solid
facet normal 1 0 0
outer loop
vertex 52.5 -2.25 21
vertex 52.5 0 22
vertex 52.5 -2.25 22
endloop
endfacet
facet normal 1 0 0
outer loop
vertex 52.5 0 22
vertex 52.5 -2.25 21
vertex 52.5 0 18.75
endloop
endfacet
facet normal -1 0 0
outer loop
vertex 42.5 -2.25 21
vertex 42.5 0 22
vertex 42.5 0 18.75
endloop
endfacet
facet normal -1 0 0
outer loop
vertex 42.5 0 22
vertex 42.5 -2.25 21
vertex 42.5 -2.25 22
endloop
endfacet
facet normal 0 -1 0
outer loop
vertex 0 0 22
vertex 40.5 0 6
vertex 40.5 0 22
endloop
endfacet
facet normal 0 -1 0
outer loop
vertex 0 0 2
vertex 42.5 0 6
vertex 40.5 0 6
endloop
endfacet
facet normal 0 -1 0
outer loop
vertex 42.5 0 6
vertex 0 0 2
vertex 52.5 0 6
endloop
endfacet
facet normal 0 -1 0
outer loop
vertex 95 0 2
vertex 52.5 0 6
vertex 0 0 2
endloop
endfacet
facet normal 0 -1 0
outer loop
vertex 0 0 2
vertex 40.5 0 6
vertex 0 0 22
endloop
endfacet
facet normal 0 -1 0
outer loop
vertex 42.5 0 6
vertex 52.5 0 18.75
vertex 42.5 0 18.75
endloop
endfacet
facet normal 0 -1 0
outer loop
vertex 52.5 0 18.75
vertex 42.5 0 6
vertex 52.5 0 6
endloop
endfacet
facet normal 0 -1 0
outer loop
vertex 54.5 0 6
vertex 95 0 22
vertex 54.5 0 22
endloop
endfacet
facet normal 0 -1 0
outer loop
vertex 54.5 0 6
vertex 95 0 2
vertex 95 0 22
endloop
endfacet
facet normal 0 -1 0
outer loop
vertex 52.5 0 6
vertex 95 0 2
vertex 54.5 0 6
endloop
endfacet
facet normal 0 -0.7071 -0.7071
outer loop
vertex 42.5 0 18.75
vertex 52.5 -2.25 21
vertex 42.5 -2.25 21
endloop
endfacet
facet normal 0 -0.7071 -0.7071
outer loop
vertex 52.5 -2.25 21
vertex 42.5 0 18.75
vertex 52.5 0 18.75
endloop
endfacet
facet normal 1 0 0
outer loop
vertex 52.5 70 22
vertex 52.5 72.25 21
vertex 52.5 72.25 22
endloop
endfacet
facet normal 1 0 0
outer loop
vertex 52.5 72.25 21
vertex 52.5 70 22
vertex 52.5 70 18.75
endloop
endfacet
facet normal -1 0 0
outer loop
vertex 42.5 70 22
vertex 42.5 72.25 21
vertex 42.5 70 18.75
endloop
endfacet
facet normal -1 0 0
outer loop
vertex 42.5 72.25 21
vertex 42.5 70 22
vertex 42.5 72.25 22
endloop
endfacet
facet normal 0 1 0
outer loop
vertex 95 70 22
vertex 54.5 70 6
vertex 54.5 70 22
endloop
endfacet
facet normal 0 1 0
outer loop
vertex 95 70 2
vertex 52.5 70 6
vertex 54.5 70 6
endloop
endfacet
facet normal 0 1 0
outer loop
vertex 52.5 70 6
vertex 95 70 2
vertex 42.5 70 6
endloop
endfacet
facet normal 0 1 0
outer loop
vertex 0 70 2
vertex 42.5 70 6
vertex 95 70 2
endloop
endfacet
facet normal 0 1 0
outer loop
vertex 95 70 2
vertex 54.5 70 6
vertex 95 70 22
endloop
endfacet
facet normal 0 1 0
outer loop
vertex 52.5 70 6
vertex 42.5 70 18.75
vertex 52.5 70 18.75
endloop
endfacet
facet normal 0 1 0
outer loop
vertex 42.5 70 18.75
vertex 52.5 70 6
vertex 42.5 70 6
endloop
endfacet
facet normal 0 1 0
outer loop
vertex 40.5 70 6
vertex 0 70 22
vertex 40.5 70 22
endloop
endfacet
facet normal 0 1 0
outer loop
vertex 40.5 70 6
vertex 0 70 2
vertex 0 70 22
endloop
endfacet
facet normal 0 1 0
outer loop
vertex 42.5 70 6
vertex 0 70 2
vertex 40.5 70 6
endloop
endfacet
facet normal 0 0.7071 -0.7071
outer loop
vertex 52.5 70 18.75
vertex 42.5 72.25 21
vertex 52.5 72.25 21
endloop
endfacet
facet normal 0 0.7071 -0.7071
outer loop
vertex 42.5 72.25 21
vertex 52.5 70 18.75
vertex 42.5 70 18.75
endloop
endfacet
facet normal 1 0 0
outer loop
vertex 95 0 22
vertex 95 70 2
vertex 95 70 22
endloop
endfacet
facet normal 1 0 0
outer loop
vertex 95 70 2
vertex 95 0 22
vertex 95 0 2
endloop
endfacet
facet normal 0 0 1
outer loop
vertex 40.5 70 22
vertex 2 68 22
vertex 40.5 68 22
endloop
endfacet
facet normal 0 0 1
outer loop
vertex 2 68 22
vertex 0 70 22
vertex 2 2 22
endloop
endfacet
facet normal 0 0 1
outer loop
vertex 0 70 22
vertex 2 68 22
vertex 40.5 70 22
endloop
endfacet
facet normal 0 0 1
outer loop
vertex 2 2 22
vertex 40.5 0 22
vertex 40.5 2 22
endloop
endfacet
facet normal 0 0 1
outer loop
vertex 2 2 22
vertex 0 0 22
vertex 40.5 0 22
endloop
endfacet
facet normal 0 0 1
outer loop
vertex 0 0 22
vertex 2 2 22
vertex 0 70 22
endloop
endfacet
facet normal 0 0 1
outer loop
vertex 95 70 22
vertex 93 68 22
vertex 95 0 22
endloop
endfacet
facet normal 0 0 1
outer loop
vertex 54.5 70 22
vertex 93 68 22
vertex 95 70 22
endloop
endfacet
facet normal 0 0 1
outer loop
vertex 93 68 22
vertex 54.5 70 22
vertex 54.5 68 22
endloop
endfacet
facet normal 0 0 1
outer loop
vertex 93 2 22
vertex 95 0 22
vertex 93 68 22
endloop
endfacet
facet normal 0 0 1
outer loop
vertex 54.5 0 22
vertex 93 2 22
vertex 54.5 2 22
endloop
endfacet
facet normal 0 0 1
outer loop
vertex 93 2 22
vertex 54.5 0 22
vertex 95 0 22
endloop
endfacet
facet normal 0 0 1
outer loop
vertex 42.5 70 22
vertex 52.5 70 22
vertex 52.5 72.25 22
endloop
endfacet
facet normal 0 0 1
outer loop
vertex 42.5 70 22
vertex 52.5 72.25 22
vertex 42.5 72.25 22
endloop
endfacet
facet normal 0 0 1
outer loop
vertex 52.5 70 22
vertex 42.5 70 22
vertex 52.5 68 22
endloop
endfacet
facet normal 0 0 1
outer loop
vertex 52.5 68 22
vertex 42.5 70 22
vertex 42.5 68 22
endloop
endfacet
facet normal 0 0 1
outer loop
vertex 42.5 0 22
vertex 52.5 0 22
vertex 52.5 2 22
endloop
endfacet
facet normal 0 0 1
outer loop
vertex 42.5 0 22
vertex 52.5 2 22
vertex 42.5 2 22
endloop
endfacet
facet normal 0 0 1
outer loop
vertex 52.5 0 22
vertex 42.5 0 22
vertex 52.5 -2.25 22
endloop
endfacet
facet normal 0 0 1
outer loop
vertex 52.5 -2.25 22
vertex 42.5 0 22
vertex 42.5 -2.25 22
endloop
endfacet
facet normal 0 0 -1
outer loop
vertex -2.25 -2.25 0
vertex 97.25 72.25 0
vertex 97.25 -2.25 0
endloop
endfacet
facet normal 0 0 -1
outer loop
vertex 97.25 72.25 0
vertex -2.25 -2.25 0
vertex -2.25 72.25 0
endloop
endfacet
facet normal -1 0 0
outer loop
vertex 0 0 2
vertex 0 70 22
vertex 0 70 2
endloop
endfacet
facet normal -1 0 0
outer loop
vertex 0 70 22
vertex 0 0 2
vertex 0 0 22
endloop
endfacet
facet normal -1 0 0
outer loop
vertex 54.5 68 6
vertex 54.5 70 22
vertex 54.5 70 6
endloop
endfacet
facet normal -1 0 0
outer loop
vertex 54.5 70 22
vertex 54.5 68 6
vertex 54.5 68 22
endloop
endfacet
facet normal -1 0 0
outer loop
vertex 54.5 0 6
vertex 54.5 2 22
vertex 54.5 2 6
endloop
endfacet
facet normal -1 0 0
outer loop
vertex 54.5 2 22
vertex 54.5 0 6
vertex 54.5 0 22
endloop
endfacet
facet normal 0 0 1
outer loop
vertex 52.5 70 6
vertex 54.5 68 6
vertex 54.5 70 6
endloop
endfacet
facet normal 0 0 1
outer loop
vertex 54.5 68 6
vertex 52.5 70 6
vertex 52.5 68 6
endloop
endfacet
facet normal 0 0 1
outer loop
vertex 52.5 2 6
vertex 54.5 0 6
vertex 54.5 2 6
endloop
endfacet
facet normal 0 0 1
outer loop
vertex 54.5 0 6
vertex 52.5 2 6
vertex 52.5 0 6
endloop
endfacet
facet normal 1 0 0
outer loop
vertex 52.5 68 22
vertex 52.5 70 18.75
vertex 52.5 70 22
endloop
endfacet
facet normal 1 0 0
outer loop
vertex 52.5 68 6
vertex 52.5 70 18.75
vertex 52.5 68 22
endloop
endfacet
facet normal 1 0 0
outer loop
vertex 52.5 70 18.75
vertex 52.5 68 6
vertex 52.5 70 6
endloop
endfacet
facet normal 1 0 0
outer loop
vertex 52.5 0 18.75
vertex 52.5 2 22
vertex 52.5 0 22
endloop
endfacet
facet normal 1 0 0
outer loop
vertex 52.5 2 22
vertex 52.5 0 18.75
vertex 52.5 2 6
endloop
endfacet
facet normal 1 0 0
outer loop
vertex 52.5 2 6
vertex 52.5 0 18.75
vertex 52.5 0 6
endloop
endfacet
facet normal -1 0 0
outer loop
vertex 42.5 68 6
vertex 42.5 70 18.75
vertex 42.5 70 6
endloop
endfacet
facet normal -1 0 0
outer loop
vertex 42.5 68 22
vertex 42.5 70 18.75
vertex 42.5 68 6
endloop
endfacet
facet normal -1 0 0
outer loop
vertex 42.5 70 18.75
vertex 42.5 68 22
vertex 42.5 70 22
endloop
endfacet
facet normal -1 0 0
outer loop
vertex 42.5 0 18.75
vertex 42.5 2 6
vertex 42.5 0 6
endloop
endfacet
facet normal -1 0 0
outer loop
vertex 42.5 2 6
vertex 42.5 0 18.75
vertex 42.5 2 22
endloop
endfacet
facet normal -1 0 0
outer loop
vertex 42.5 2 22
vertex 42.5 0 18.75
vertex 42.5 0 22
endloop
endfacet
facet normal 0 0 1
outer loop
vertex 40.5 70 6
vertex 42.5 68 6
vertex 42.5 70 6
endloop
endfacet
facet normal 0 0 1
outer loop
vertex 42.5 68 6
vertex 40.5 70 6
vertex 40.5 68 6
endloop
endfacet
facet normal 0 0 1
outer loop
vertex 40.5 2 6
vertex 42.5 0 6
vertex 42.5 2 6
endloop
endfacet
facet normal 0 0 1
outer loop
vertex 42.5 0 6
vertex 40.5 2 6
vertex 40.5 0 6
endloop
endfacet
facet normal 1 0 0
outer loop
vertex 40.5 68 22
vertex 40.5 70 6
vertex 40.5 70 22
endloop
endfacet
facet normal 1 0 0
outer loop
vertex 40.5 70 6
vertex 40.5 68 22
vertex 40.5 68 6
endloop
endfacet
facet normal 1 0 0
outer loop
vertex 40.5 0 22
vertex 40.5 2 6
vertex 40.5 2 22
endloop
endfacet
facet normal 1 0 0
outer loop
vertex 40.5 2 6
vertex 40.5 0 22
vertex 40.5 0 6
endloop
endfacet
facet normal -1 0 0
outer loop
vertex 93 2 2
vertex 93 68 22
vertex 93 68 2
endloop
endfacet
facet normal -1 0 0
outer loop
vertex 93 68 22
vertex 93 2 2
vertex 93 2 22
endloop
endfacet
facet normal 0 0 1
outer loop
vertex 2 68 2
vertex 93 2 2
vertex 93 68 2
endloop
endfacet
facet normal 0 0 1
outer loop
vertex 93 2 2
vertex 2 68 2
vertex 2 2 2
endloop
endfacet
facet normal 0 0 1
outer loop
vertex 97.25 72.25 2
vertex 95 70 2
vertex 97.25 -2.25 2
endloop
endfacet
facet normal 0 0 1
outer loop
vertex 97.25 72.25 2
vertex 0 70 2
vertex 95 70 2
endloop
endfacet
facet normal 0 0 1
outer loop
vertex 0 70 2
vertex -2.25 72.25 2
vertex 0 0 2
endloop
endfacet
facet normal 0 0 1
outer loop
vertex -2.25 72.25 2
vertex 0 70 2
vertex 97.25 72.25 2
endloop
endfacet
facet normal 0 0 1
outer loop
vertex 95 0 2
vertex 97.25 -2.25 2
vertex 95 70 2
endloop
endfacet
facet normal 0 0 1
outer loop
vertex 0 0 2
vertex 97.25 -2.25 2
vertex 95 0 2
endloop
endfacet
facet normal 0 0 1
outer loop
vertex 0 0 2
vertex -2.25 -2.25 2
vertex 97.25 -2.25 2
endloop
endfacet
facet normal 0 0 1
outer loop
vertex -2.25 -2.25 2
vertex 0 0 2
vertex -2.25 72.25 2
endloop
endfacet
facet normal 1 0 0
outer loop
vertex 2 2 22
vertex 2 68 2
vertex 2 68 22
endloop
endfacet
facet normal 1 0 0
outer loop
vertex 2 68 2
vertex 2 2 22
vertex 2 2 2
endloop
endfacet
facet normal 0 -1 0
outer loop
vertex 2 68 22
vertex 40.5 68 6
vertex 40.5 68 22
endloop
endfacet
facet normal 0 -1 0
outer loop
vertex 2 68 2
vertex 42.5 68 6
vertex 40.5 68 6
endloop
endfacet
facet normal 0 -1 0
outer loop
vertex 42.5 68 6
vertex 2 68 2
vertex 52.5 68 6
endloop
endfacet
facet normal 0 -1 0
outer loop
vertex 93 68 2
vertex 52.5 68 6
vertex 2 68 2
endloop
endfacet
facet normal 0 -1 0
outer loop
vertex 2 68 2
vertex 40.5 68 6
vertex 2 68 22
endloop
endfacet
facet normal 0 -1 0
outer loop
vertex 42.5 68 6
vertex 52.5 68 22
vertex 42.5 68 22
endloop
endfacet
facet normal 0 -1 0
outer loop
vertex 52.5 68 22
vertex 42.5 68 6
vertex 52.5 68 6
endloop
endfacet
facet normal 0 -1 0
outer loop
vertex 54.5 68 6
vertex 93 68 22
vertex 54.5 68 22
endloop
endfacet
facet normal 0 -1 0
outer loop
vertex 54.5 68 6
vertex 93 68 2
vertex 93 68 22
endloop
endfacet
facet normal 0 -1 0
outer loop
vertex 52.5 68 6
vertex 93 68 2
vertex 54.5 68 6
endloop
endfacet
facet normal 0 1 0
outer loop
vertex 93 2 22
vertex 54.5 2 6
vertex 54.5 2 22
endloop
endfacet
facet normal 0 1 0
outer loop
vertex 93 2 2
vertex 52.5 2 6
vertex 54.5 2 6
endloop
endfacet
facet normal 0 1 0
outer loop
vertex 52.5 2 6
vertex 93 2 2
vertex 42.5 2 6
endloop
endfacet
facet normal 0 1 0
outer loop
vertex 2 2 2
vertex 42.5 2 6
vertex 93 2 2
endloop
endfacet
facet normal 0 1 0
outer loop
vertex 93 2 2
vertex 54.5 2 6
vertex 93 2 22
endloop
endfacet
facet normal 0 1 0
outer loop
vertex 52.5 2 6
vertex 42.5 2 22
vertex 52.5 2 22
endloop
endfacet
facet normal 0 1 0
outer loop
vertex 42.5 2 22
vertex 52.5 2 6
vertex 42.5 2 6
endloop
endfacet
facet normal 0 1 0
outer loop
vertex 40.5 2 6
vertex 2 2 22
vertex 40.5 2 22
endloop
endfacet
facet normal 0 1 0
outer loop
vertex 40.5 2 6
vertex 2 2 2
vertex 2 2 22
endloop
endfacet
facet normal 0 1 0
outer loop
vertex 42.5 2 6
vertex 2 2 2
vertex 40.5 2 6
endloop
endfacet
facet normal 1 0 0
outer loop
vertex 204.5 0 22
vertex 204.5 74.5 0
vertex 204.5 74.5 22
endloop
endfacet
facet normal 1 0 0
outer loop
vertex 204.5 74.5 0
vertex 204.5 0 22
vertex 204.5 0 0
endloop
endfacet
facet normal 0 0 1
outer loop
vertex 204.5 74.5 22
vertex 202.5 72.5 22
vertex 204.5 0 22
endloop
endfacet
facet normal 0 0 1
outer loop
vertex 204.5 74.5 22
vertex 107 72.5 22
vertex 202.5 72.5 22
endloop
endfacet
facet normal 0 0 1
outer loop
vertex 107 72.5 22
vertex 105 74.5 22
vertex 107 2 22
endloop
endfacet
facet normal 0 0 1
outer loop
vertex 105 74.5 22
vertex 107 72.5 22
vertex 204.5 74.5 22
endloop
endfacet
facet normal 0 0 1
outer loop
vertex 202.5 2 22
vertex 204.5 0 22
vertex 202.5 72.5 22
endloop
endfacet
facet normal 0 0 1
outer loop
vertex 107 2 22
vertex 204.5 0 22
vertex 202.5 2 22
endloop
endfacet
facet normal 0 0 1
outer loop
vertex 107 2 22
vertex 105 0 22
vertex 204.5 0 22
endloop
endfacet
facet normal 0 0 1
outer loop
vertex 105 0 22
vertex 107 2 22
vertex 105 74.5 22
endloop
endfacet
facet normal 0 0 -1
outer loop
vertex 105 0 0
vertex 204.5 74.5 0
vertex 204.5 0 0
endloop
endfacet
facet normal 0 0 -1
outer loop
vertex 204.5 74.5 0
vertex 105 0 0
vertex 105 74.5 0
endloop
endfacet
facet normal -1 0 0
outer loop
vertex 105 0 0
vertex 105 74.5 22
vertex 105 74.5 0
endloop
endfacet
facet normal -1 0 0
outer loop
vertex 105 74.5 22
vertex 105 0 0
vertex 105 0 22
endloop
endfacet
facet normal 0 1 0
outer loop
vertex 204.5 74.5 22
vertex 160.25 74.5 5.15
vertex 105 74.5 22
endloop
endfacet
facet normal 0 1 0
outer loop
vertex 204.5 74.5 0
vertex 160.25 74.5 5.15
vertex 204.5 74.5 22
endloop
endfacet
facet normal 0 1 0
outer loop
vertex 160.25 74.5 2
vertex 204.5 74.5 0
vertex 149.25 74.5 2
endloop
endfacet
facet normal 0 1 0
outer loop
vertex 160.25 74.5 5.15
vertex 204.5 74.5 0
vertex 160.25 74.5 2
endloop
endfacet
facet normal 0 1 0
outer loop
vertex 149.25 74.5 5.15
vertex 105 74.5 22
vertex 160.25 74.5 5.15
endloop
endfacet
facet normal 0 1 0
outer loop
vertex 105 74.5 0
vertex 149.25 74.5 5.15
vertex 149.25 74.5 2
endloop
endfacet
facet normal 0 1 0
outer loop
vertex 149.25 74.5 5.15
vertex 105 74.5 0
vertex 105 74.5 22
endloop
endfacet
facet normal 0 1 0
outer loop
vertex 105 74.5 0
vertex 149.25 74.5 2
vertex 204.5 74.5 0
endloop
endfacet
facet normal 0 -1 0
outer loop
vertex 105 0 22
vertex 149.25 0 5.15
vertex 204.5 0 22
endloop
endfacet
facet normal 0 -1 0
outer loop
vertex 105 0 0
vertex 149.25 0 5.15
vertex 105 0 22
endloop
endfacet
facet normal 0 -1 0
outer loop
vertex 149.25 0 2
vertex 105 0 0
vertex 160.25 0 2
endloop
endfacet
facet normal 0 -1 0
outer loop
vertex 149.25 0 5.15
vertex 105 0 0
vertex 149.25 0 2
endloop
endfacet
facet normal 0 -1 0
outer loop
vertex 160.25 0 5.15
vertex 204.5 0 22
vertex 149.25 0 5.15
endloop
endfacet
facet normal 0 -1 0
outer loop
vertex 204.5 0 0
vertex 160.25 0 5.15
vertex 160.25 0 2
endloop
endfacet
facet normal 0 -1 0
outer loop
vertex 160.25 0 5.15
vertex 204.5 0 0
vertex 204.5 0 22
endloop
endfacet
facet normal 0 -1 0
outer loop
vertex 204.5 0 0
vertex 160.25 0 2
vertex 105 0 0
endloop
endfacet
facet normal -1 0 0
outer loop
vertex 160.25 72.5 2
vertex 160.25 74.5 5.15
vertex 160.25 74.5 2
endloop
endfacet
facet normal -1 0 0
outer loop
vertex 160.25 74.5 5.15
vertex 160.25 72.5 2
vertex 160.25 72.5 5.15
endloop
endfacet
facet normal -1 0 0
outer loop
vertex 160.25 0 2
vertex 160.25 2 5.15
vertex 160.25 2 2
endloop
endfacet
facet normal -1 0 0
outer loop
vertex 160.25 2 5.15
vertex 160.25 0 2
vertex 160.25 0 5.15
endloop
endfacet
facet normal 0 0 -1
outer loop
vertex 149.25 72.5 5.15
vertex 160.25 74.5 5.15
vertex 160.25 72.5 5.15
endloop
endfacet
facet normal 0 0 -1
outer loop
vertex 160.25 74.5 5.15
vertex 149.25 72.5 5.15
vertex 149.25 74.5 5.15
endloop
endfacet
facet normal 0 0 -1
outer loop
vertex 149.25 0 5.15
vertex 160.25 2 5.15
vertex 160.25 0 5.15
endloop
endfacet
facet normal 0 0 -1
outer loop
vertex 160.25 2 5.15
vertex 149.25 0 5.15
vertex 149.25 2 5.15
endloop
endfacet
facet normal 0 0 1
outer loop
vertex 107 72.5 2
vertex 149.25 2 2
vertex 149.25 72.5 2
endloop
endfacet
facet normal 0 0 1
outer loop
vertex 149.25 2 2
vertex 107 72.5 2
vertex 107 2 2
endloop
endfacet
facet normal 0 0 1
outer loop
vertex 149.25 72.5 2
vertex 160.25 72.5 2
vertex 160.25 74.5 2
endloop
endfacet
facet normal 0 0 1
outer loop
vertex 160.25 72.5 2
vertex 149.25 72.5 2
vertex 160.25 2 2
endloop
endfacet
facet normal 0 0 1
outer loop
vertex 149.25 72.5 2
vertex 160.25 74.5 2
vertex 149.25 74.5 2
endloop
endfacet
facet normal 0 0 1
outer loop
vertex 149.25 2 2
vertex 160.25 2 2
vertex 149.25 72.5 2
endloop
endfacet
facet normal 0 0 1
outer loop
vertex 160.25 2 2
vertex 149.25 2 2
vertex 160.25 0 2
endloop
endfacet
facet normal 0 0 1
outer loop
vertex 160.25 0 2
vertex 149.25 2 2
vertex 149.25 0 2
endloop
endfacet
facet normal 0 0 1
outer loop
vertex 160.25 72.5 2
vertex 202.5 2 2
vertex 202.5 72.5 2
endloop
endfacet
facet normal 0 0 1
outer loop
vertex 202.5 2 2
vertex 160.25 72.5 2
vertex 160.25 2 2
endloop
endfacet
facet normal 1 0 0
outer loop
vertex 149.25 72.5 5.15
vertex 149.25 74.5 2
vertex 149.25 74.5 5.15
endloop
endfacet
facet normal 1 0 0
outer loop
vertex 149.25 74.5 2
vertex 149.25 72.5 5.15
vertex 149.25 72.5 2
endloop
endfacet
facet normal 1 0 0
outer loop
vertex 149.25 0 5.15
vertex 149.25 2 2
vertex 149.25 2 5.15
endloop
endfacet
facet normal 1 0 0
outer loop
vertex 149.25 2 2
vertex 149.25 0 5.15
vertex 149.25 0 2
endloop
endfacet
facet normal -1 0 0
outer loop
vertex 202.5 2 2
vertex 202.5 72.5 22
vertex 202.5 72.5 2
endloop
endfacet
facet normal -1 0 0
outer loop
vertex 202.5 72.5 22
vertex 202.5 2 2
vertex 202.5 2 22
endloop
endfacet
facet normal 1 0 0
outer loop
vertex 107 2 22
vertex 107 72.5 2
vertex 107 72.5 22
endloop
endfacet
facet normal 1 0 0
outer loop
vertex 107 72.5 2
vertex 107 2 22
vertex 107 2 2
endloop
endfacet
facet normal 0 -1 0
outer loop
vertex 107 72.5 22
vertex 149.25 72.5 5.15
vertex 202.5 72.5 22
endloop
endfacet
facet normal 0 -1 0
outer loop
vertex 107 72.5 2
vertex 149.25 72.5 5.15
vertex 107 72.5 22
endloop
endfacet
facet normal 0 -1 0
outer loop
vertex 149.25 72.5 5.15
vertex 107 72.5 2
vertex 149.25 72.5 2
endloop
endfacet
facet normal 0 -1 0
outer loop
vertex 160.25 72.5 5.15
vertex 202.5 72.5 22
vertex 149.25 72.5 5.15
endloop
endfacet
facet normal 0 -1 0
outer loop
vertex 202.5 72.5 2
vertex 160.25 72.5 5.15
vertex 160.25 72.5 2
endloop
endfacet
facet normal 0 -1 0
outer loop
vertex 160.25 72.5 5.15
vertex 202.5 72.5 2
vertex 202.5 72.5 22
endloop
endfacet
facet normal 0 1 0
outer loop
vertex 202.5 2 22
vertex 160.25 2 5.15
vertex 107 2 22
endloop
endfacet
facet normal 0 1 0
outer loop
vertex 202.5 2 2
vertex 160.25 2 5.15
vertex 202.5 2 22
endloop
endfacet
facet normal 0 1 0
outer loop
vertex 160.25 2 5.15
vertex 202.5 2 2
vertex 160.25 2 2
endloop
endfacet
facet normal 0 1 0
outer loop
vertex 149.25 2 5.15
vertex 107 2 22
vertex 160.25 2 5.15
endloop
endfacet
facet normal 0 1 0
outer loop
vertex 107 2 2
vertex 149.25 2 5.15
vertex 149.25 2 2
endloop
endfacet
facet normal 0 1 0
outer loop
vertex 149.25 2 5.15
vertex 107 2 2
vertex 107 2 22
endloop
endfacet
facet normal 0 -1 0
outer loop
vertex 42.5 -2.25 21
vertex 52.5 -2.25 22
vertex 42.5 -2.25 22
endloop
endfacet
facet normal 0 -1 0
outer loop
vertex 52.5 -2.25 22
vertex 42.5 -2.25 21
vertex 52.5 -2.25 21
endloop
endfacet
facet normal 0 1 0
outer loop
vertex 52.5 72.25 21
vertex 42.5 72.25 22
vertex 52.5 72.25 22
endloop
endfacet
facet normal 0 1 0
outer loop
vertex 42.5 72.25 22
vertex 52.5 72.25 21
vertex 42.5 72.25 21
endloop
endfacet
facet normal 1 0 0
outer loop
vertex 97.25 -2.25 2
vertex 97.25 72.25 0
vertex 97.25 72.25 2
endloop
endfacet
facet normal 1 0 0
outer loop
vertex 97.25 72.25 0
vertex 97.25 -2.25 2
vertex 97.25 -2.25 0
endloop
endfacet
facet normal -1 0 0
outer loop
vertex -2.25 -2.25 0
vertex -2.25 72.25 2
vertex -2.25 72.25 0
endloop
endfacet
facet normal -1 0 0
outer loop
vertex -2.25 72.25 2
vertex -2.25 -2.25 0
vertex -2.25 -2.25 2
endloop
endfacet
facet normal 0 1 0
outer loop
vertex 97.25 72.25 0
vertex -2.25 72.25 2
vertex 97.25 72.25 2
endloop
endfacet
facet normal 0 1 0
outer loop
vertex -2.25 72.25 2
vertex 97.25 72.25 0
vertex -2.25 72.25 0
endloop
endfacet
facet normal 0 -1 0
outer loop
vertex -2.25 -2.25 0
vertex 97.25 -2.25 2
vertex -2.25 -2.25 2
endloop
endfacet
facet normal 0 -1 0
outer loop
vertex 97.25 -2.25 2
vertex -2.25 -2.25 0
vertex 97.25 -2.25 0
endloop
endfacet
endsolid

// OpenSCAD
CARD_SIZE_LONG_EDGE =91;
CARD_SIZE_SHORT_EDGE = 66;
CARD_STACK_HEIGHT = 20;
WALL_THICKNESS = 2;
TAB_THICKNESS = 10;
EXTRA_SPACE = .25;


CARD_LONG_EDGE = CARD_SIZE_LONG_EDGE + (WALL_THICKNESS*2);
CARD_SHORT_EDGE = CARD_SIZE_SHORT_EDGE + (WALL_THICKNESS*2);
ALL_EXTRA_SPACE = (EXTRA_SPACE *2);

LID_OUTSIDE_LONG_THICKNESS = CARD_LONG_EDGE + (WALL_THICKNESS*2);
LID_OUTSIDE_SHORT_THICKNESS = CARD_SHORT_EDGE + (WALL_THICKNESS*2);

SPACE_BETWEEN_BOTTOM_AND_LID = LID_OUTSIDE_LONG_THICKNESS + (WALL_THICKNESS*2)+ 2;

HEIGHT = CARD_STACK_HEIGHT + WALL_THICKNESS;

	//*Start Bottom of Box

					//*Start wedge 1
translate ([((CARD_LONG_EDGE/2) -(TAB_THICKNESS/2)),-WALL_THICKNESS-EXTRA_SPACE,HEIGHT-WALL_THICKNESS-1-EXTRA_SPACE]) 

difference (){
cube ([TAB_THICKNESS,WALL_THICKNESS+EXTRA_SPACE,WALL_THICKNESS+EXTRA_SPACE]);
translate ([0, WALL_THICKNESS+(EXTRA_SPACE),0]) rotate ([135,0,0])  

cube ([(TAB_THICKNESS+3), sqrt(((WALL_THICKNESS+EXTRA_SPACE)*(WALL_THICKNESS+EXTRA_SPACE))+((WALL_THICKNESS+EXTRA_SPACE)*(WALL_THICKNESS+EXTRA_SPACE))), sqrt(((WALL_THICKNESS+EXTRA_SPACE)*(WALL_THICKNESS+EXTRA_SPACE))+((WALL_THICKNESS+EXTRA_SPACE)*(WALL_THICKNESS+EXTRA_SPACE)))]);

}
			//*end wedge 1


			//*Start wedge 2
translate ([((CARD_LONG_EDGE/2) - (TAB_THICKNESS/2)),CARD_SHORT_EDGE,HEIGHT-WALL_THICKNESS-1-EXTRA_SPACE])

 difference (){
cube ([TAB_THICKNESS,WALL_THICKNESS+EXTRA_SPACE,WALL_THICKNESS+EXTRA_SPACE]);

translate ([0 ,0 ,0]) rotate ([-45,0,0])  cube ([(TAB_THICKNESS+3),sqrt(((WALL_THICKNESS+EXTRA_SPACE)*(WALL_THICKNESS+EXTRA_SPACE))+((WALL_THICKNESS+EXTRA_SPACE)*(WALL_THICKNESS+EXTRA_SPACE))),sqrt(((WALL_THICKNESS+EXTRA_SPACE)*(WALL_THICKNESS+EXTRA_SPACE))+((WALL_THICKNESS+EXTRA_SPACE)*(WALL_THICKNESS+EXTRA_SPACE)))]);
}
			//*end wedge 2


translate ([((CARD_LONG_EDGE/2) -(TAB_THICKNESS/2)),-WALL_THICKNESS-EXTRA_SPACE,HEIGHT-1])  cube ([TAB_THICKNESS, WALL_THICKNESS+EXTRA_SPACE, 1]); 					//*Tab

translate ([((CARD_LONG_EDGE/2) -(TAB_THICKNESS/2)),CARD_SHORT_EDGE,HEIGHT-1])  cube ([TAB_THICKNESS, WALL_THICKNESS+EXTRA_SPACE, 1]);				//*Tab

translate ([-WALL_THICKNESS-EXTRA_SPACE, -WALL_THICKNESS-EXTRA_SPACE, 0 ]) cube ([CARD_LONG_EDGE + (WALL_THICKNESS*2)+ALL_EXTRA_SPACE, CARD_SHORT_EDGE + (WALL_THICKNESS*2)+ALL_EXTRA_SPACE, WALL_THICKNESS]);  						//*Bottom Plate

difference() 
{
	cube ([CARD_LONG_EDGE,CARD_SHORT_EDGE,HEIGHT]);		//*Main Body

	translate([ ((CARD_LONG_EDGE / 2) + (TAB_THICKNESS/2)), -.5, ((HEIGHT+ WALL_THICKNESS) / 4) ]) cube ([2, CARD_SHORT_EDGE + 2, HEIGHT]);	//*Tab cutout
	
	translate([ ((CARD_LONG_EDGE / 2) - ((TAB_THICKNESS/2)+2)), -.5, ((HEIGHT+ WALL_THICKNESS)/ 4) ]) cube ([2, CARD_SHORT_EDGE + 2, HEIGHT ]);  //*Tab cutout

	translate([WALL_THICKNESS,WALL_THICKNESS,WALL_THICKNESS]) cube ([CARD_LONG_EDGE - (WALL_THICKNESS*2),CARD_SHORT_EDGE - (WALL_THICKNESS*2),HEIGHT]);			//*Hole
}

			//*End Bottom of Box



			//*Start Top of Box


translate ([SPACE_BETWEEN_BOTTOM_AND_LID, 0, 0]) 


difference() 
{
	cube ([LID_OUTSIDE_LONG_THICKNESS+ALL_EXTRA_SPACE, LID_OUTSIDE_SHORT_THICKNESS+ALL_EXTRA_SPACE, HEIGHT]); 		//*Top Main Body


	translate([ ((LID_OUTSIDE_LONG_THICKNESS+ALL_EXTRA_SPACE) / 2)-((TAB_THICKNESS+1)/2), -.5, WALL_THICKNESS]) 
cube ([(TAB_THICKNESS+1), LID_OUTSIDE_SHORT_THICKNESS + 2, WALL_THICKNESS+1.15 ]); 	//*Tab Hole

	translate([WALL_THICKNESS,WALL_THICKNESS, WALL_THICKNESS]) 
cube ([LID_OUTSIDE_LONG_THICKNESS - (WALL_THICKNESS*2)+ALL_EXTRA_SPACE,LID_OUTSIDE_SHORT_THICKNESS - (WALL_THICKNESS*2)+ALL_EXTRA_SPACE,HEIGHT]);		//*Hole
}

			//* End Top of Box
